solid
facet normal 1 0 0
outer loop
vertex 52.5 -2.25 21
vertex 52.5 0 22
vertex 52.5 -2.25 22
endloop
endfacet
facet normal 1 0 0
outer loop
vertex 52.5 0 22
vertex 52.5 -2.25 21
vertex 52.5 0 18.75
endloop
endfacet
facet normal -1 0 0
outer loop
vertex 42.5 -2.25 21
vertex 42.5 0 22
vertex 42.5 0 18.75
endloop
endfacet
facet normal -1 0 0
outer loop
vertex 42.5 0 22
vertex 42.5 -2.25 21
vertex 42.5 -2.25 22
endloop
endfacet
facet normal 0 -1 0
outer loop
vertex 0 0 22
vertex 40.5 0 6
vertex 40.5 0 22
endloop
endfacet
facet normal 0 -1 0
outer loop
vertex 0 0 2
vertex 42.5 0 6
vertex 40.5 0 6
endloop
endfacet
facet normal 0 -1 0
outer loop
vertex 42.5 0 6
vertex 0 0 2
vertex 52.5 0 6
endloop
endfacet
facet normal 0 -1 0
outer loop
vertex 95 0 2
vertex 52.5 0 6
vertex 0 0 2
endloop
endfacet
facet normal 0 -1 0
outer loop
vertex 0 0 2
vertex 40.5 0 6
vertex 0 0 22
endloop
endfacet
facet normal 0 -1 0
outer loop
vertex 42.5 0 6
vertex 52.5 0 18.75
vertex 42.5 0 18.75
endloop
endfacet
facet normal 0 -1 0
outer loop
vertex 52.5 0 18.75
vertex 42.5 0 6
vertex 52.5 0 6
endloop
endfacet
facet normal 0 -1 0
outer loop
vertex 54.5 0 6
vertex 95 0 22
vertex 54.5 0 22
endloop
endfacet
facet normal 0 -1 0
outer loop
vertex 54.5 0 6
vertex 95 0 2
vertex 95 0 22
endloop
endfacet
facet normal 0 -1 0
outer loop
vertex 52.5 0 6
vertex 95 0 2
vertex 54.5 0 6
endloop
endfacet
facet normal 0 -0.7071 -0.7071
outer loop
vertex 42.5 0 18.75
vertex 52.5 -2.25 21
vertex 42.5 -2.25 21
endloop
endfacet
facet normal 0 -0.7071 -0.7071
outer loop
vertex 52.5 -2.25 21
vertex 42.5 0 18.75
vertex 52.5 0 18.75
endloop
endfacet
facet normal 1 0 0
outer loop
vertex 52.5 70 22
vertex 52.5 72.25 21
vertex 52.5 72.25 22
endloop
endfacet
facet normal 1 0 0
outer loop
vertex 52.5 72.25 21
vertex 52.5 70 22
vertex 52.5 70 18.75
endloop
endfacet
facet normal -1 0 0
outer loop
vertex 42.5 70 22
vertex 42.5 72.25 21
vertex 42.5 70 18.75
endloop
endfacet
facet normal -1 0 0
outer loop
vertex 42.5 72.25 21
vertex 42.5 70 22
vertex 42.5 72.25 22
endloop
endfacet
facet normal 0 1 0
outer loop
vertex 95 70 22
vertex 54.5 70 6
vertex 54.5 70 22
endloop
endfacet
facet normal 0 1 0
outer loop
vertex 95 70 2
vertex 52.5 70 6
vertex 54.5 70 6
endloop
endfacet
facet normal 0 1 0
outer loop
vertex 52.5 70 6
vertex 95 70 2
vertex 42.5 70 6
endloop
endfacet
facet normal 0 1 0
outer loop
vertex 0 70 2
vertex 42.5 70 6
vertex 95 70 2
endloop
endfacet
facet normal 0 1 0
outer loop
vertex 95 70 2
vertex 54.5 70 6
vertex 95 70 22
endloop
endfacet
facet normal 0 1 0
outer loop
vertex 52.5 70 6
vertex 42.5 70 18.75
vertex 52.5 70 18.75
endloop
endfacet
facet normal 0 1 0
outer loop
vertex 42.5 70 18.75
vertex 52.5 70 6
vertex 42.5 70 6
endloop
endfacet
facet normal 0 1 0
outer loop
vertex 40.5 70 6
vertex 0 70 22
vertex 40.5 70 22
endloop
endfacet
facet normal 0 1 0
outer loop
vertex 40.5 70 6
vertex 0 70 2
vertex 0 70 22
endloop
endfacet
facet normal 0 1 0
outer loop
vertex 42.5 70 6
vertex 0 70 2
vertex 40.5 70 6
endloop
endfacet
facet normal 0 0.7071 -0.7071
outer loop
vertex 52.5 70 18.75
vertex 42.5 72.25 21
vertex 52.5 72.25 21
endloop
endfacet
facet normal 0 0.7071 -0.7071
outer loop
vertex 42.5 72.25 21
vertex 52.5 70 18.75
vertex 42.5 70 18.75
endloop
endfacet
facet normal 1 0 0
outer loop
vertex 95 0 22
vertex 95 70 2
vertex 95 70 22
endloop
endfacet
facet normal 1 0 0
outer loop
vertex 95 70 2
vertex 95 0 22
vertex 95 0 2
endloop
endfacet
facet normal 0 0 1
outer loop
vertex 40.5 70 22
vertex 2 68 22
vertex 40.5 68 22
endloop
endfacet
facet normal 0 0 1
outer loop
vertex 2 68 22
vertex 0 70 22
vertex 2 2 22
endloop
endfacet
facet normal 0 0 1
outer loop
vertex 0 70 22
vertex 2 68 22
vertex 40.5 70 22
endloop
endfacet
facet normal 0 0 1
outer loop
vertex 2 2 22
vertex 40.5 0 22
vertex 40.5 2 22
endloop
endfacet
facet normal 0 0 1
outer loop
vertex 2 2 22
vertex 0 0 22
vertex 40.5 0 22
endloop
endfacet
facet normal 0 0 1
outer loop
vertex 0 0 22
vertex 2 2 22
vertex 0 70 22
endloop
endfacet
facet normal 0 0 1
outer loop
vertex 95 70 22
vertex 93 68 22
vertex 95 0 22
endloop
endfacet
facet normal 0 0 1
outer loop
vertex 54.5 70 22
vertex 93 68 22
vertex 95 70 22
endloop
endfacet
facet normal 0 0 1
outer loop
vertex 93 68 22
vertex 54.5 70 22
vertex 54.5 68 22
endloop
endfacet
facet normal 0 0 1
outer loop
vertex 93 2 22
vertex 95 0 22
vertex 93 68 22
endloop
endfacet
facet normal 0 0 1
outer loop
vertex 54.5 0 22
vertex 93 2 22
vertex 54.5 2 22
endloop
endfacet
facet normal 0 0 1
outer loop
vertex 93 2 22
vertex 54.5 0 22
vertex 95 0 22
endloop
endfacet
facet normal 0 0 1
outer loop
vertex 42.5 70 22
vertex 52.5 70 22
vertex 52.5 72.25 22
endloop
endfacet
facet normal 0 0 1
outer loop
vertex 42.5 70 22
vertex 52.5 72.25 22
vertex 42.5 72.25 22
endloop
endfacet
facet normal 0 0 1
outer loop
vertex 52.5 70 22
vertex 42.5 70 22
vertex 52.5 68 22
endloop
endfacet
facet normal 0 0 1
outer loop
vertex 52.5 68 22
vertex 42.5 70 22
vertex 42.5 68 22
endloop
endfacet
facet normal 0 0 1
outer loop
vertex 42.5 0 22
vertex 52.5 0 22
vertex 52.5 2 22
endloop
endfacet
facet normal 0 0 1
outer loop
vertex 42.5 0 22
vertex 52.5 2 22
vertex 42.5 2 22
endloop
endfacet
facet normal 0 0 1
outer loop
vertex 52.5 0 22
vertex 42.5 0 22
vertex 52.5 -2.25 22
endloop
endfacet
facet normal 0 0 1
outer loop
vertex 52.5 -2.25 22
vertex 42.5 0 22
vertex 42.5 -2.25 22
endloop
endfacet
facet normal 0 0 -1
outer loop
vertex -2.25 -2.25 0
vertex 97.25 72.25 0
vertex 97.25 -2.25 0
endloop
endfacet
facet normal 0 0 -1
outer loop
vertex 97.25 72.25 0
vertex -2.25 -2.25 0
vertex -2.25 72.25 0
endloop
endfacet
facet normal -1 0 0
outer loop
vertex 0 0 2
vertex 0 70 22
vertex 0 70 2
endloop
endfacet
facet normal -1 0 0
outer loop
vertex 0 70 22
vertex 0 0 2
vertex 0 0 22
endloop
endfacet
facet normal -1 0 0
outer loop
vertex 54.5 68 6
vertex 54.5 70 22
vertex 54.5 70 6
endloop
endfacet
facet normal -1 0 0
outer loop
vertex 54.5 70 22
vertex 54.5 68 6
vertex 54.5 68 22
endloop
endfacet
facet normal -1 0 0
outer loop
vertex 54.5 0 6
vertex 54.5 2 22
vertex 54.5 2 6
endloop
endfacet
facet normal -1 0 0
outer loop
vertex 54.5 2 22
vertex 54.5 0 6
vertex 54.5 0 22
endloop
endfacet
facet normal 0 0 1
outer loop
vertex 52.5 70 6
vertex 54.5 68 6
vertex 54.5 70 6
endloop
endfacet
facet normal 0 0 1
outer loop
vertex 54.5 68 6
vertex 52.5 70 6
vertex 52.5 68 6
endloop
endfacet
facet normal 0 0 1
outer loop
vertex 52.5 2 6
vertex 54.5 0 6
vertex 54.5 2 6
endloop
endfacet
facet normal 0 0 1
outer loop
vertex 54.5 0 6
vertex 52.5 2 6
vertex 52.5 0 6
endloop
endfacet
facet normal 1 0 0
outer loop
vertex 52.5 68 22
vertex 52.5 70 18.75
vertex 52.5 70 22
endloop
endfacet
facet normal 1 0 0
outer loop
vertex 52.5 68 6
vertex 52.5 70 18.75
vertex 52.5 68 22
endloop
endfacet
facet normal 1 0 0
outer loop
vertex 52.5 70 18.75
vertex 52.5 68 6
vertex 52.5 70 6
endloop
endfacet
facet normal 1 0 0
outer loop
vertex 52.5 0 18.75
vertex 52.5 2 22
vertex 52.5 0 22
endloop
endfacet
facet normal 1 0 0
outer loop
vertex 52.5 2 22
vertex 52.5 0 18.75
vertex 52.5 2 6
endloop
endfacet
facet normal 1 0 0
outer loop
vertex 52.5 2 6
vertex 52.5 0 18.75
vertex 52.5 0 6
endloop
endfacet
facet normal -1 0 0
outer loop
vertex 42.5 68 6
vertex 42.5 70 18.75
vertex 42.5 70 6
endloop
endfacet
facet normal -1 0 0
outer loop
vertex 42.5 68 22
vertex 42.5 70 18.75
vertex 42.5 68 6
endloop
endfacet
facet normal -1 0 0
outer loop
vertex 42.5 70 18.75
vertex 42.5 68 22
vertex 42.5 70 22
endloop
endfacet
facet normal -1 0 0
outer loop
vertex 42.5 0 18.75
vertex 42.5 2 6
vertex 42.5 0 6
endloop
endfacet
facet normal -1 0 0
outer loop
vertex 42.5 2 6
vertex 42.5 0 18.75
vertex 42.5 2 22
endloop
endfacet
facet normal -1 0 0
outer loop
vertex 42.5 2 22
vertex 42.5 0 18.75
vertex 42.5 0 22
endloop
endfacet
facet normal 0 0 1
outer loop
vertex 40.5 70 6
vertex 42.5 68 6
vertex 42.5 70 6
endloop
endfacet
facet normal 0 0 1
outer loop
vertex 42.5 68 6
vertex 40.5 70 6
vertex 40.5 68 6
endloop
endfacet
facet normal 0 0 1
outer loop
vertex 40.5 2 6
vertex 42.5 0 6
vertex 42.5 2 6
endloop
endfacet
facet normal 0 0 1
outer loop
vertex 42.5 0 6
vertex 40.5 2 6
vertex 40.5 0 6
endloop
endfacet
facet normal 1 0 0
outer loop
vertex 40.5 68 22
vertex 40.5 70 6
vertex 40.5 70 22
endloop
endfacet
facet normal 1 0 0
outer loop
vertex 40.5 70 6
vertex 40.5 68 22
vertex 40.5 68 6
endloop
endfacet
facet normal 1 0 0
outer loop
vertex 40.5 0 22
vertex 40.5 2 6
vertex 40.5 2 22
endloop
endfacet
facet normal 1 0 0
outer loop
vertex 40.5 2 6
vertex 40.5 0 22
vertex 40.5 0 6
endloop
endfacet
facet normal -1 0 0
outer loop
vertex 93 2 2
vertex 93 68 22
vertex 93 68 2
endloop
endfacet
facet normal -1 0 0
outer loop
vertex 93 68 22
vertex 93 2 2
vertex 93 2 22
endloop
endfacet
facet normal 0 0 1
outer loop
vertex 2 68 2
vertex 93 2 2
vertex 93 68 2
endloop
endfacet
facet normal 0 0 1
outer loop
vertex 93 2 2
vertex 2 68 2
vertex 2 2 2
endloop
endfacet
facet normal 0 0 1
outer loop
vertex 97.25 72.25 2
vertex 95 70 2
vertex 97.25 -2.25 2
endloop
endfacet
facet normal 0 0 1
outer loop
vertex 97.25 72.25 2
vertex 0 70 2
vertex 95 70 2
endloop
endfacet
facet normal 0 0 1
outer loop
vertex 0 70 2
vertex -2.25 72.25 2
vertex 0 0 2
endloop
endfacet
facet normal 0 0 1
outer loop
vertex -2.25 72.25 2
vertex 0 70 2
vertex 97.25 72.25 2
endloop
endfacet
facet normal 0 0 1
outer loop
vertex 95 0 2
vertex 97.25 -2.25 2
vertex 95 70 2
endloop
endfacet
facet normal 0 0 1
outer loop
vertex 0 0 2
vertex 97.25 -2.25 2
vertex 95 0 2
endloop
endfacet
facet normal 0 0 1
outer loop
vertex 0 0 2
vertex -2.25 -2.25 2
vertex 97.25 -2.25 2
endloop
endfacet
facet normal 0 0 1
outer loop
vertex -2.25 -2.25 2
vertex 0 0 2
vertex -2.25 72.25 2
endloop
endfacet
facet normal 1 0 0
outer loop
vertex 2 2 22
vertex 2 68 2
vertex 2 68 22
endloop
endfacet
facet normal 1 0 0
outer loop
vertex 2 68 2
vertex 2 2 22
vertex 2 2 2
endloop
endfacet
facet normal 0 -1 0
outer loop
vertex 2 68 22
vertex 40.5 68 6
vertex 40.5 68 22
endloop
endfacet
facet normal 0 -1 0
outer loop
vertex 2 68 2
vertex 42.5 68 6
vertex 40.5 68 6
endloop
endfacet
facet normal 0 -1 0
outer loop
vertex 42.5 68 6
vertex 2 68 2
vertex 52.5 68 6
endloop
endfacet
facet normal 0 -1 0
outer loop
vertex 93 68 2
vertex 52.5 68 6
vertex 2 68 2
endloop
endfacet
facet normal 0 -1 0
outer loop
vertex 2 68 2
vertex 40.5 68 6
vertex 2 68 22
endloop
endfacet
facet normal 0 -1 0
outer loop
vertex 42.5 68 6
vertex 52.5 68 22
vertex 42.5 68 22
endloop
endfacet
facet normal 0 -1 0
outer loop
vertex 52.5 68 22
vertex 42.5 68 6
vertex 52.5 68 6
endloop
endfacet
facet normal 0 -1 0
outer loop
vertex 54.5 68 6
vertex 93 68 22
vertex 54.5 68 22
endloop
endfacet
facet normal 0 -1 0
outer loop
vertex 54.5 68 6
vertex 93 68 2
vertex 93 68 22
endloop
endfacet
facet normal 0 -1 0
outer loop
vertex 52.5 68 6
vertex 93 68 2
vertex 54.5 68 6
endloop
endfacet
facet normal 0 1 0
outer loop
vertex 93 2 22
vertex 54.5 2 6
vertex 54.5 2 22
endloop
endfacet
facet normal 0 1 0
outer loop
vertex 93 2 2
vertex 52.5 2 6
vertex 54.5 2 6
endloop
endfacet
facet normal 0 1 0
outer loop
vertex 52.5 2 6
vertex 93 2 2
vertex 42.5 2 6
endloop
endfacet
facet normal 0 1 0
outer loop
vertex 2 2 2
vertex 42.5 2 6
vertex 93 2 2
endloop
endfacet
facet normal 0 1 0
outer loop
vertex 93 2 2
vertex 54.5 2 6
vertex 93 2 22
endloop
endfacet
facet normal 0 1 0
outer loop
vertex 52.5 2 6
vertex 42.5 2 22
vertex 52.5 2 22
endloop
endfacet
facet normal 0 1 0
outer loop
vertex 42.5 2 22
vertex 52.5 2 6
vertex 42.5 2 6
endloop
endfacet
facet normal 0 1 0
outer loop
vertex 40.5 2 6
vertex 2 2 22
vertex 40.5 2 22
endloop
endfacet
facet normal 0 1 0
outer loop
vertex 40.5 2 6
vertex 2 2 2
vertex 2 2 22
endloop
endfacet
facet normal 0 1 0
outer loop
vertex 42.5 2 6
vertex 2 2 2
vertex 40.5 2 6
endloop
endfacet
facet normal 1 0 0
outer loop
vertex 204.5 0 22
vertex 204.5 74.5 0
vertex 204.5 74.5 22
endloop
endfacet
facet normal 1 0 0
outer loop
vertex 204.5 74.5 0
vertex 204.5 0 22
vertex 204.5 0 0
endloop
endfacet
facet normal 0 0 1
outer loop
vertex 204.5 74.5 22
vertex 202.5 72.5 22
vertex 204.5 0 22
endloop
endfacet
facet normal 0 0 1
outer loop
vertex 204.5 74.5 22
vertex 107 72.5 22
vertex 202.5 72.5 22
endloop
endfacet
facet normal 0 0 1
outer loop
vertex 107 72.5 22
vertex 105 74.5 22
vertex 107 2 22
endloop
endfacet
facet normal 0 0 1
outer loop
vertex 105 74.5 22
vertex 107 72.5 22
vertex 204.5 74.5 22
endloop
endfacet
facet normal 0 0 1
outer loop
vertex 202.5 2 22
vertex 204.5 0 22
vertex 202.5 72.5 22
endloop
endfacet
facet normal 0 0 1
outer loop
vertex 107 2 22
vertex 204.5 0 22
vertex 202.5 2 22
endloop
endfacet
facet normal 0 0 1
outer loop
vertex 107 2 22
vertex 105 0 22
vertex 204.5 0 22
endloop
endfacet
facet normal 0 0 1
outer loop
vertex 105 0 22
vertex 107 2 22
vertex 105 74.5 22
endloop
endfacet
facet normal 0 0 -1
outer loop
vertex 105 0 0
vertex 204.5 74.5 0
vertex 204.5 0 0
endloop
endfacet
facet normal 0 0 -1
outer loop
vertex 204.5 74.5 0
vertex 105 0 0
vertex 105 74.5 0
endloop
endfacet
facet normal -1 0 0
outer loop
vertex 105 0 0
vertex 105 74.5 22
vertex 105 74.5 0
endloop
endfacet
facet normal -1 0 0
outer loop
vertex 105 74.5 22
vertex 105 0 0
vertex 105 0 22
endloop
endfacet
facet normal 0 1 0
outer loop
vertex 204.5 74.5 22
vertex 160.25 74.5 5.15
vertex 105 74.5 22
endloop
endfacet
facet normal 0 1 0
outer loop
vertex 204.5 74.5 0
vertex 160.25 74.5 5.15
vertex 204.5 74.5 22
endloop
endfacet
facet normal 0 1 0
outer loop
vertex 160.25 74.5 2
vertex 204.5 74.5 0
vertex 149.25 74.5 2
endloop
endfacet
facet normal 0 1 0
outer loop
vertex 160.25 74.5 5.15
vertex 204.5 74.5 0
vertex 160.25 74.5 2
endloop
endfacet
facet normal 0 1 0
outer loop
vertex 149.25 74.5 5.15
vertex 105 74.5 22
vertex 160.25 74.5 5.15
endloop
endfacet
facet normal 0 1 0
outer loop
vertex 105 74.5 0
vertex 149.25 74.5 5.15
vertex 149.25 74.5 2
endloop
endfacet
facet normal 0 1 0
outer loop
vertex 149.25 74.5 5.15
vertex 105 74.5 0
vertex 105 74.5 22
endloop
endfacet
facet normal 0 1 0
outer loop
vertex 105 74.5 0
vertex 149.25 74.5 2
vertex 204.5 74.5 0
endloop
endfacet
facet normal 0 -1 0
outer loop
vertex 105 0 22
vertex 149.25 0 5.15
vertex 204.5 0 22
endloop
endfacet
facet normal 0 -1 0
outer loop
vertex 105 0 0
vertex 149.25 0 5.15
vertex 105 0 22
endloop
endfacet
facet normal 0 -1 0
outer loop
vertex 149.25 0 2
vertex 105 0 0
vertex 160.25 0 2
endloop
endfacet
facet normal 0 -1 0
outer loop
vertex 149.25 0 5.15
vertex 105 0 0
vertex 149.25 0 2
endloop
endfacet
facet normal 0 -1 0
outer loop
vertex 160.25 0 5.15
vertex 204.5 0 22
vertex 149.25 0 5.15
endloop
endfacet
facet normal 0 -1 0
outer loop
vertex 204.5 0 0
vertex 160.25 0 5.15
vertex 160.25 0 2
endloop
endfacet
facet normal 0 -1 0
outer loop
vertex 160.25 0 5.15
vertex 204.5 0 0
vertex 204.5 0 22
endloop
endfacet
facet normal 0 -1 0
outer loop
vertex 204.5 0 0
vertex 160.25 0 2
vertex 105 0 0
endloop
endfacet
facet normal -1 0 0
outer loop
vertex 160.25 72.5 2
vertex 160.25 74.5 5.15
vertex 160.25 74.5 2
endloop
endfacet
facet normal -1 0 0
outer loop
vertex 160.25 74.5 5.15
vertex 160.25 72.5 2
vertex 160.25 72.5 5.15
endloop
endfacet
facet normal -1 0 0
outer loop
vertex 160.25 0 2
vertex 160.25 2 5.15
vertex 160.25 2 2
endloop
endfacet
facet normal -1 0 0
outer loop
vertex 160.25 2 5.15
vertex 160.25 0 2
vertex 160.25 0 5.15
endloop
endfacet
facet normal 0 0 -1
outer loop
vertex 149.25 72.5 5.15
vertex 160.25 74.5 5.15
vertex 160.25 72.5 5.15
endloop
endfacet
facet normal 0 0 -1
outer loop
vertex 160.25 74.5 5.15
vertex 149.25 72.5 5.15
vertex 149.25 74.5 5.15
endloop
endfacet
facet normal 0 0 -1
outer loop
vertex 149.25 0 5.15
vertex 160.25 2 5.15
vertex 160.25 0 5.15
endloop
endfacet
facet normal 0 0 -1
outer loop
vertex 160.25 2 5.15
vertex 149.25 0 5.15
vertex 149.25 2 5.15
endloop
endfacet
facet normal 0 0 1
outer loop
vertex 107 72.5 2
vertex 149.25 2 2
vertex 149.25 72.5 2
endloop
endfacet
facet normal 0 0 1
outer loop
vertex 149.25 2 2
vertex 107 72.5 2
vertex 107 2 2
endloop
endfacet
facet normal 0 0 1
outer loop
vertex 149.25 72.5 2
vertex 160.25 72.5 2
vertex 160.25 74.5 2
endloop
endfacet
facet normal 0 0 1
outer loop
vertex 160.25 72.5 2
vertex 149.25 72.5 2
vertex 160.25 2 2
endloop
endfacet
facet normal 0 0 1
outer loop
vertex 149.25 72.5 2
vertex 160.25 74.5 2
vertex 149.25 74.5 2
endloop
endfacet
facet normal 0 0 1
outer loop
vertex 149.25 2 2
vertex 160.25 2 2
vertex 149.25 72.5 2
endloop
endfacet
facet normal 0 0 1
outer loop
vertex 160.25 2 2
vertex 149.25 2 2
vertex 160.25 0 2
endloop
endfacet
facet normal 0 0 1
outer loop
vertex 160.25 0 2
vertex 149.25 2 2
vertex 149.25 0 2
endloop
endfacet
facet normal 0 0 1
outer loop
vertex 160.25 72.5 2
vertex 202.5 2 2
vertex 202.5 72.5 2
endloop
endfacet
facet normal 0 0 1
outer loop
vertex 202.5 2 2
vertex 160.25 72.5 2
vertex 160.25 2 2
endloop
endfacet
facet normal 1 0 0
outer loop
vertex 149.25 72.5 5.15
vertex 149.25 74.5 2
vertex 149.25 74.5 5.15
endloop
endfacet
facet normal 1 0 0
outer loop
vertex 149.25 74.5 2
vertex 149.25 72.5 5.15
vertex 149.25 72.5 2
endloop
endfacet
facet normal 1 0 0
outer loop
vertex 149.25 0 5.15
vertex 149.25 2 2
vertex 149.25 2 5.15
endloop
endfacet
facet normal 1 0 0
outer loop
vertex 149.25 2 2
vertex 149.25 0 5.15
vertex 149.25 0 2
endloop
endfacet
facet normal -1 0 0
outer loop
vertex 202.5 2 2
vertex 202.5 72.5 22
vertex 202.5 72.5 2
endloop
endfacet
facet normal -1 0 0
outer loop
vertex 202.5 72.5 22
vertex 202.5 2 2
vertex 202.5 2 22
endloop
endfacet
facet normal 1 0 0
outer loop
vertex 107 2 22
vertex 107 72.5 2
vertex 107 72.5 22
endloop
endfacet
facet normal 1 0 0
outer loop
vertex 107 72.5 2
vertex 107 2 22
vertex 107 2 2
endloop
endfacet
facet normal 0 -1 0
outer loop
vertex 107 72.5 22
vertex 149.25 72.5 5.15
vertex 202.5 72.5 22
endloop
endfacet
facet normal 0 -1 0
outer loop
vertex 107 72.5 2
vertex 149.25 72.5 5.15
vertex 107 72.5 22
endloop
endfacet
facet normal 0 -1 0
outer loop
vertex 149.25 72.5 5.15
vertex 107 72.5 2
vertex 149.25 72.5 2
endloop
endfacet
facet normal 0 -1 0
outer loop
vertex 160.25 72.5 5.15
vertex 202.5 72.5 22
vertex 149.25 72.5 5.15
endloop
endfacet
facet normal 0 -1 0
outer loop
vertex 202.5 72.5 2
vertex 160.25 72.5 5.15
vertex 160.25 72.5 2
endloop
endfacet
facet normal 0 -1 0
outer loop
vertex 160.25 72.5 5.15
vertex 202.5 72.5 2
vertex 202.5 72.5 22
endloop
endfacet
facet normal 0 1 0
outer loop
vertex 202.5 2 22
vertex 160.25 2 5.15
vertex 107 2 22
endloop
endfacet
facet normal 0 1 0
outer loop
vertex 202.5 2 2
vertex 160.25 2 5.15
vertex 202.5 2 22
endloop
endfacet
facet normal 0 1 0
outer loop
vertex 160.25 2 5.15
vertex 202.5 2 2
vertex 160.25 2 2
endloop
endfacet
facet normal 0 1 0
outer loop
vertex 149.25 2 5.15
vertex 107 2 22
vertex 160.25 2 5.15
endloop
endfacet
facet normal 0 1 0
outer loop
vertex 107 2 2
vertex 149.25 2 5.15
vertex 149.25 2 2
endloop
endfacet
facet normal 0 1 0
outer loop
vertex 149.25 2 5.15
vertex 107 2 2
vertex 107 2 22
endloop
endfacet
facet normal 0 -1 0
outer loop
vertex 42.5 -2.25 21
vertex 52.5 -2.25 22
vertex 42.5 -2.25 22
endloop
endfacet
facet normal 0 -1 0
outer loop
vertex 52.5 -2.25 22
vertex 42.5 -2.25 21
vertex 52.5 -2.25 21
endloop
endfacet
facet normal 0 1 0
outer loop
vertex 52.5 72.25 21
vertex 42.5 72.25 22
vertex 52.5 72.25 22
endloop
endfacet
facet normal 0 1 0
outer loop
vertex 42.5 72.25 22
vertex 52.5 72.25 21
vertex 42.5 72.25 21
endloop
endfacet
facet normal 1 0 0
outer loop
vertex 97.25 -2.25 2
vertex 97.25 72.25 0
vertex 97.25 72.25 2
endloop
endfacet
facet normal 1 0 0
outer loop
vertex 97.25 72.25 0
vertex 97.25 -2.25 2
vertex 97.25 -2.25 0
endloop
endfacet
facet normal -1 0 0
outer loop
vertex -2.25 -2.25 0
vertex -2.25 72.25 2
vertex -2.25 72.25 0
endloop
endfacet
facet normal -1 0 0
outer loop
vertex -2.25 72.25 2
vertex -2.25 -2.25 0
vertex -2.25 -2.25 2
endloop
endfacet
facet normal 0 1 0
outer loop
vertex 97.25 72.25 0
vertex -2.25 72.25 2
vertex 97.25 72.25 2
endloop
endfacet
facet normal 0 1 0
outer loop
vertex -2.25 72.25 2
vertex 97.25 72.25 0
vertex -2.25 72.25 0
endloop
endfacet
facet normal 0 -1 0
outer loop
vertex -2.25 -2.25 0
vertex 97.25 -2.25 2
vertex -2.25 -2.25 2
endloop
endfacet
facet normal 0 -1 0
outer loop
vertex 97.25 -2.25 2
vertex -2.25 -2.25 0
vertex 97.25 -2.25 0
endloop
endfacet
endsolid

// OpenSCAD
CARD_SIZE_LONG_EDGE =91;
CARD_SIZE_SHORT_EDGE = 66;
CARD_STACK_HEIGHT = 20;
WALL_THICKNESS = 2;
TAB_THICKNESS = 10;
EXTRA_SPACE = .25;


CARD_LONG_EDGE = CARD_SIZE_LONG_EDGE + (WALL_THICKNESS*2);
CARD_SHORT_EDGE = CARD_SIZE_SHORT_EDGE + (WALL_THICKNESS*2);
ALL_EXTRA_SPACE = (EXTRA_SPACE *2);

LID_OUTSIDE_LONG_THICKNESS = CARD_LONG_EDGE + (WALL_THICKNESS*2);
LID_OUTSIDE_SHORT_THICKNESS = CARD_SHORT_EDGE + (WALL_THICKNESS*2);

SPACE_BETWEEN_BOTTOM_AND_LID = LID_OUTSIDE_LONG_THICKNESS + (WALL_THICKNESS*2)+ 2;

HEIGHT = CARD_STACK_HEIGHT + WALL_THICKNESS;

	//*Start Bottom of Box

					//*Start wedge 1
translate ([((CARD_LONG_EDGE/2) -(TAB_THICKNESS/2)),-WALL_THICKNESS-EXTRA_SPACE,HEIGHT-WALL_THICKNESS-1-EXTRA_SPACE]) 

difference (){
cube ([TAB_THICKNESS,WALL_THICKNESS+EXTRA_SPACE,WALL_THICKNESS+EXTRA_SPACE]);
translate ([0, WALL_THICKNESS+(EXTRA_SPACE),0]) rotate ([135,0,0])  

cube ([(TAB_THICKNESS+3), sqrt(((WALL_THICKNESS+EXTRA_SPACE)*(WALL_THICKNESS+EXTRA_SPACE))+((WALL_THICKNESS+EXTRA_SPACE)*(WALL_THICKNESS+EXTRA_SPACE))), sqrt(((WALL_THICKNESS+EXTRA_SPACE)*(WALL_THICKNESS+EXTRA_SPACE))+((WALL_THICKNESS+EXTRA_SPACE)*(WALL_THICKNESS+EXTRA_SPACE)))]);

}
			//*end wedge 1


			//*Start wedge 2
translate ([((CARD_LONG_EDGE/2) - (TAB_THICKNESS/2)),CARD_SHORT_EDGE,HEIGHT-WALL_THICKNESS-1-EXTRA_SPACE])

 difference (){
cube ([TAB_THICKNESS,WALL_THICKNESS+EXTRA_SPACE,WALL_THICKNESS+EXTRA_SPACE]);

translate ([0 ,0 ,0]) rotate ([-45,0,0])  cube ([(TAB_THICKNESS+3),sqrt(((WALL_THICKNESS+EXTRA_SPACE)*(WALL_THICKNESS+EXTRA_SPACE))+((WALL_THICKNESS+EXTRA_SPACE)*(WALL_THICKNESS+EXTRA_SPACE))),sqrt(((WALL_THICKNESS+EXTRA_SPACE)*(WALL_THICKNESS+EXTRA_SPACE))+((WALL_THICKNESS+EXTRA_SPACE)*(WALL_THICKNESS+EXTRA_SPACE)))]);
}
			//*end wedge 2


translate ([((CARD_LONG_EDGE/2) -(TAB_THICKNESS/2)),-WALL_THICKNESS-EXTRA_SPACE,HEIGHT-1])  cube ([TAB_THICKNESS, WALL_THICKNESS+EXTRA_SPACE, 1]); 					//*Tab

translate ([((CARD_LONG_EDGE/2) -(TAB_THICKNESS/2)),CARD_SHORT_EDGE,HEIGHT-1])  cube ([TAB_THICKNESS, WALL_THICKNESS+EXTRA_SPACE, 1]);				//*Tab

translate ([-WALL_THICKNESS-EXTRA_SPACE, -WALL_THICKNESS-EXTRA_SPACE, 0 ]) cube ([CARD_LONG_EDGE + (WALL_THICKNESS*2)+ALL_EXTRA_SPACE, CARD_SHORT_EDGE + (WALL_THICKNESS*2)+ALL_EXTRA_SPACE, WALL_THICKNESS]);  						//*Bottom Plate

difference() 
{
	cube ([CARD_LONG_EDGE,CARD_SHORT_EDGE,HEIGHT]);		//*Main Body

	translate([ ((CARD_LONG_EDGE / 2) + (TAB_THICKNESS/2)), -.5, ((HEIGHT+ WALL_THICKNESS) / 4) ]) cube ([2, CARD_SHORT_EDGE + 2, HEIGHT]);	//*Tab cutout
	
	translate([ ((CARD_LONG_EDGE / 2) - ((TAB_THICKNESS/2)+2)), -.5, ((HEIGHT+ WALL_THICKNESS)/ 4) ]) cube ([2, CARD_SHORT_EDGE + 2, HEIGHT ]);  //*Tab cutout

	translate([WALL_THICKNESS,WALL_THICKNESS,WALL_THICKNESS]) cube ([CARD_LONG_EDGE - (WALL_THICKNESS*2),CARD_SHORT_EDGE - (WALL_THICKNESS*2),HEIGHT]);			//*Hole
}

			//*End Bottom of Box



			//*Start Top of Box


translate ([SPACE_BETWEEN_BOTTOM_AND_LID, 0, 0]) 


difference() 
{
	cube ([LID_OUTSIDE_LONG_THICKNESS+ALL_EXTRA_SPACE, LID_OUTSIDE_SHORT_THICKNESS+ALL_EXTRA_SPACE, HEIGHT]); 		//*Top Main Body


	translate([ ((LID_OUTSIDE_LONG_THICKNESS+ALL_EXTRA_SPACE) / 2)-((TAB_THICKNESS+1)/2), -.5, WALL_THICKNESS]) 
cube ([(TAB_THICKNESS+1), LID_OUTSIDE_SHORT_THICKNESS + 2, WALL_THICKNESS+1.15 ]); 	//*Tab Hole

	translate([WALL_THICKNESS,WALL_THICKNESS, WALL_THICKNESS]) 
cube ([LID_OUTSIDE_LONG_THICKNESS - (WALL_THICKNESS*2)+ALL_EXTRA_SPACE,LID_OUTSIDE_SHORT_THICKNESS - (WALL_THICKNESS*2)+ALL_EXTRA_SPACE,HEIGHT]);		//*Hole
}

			//* End Top of Box
